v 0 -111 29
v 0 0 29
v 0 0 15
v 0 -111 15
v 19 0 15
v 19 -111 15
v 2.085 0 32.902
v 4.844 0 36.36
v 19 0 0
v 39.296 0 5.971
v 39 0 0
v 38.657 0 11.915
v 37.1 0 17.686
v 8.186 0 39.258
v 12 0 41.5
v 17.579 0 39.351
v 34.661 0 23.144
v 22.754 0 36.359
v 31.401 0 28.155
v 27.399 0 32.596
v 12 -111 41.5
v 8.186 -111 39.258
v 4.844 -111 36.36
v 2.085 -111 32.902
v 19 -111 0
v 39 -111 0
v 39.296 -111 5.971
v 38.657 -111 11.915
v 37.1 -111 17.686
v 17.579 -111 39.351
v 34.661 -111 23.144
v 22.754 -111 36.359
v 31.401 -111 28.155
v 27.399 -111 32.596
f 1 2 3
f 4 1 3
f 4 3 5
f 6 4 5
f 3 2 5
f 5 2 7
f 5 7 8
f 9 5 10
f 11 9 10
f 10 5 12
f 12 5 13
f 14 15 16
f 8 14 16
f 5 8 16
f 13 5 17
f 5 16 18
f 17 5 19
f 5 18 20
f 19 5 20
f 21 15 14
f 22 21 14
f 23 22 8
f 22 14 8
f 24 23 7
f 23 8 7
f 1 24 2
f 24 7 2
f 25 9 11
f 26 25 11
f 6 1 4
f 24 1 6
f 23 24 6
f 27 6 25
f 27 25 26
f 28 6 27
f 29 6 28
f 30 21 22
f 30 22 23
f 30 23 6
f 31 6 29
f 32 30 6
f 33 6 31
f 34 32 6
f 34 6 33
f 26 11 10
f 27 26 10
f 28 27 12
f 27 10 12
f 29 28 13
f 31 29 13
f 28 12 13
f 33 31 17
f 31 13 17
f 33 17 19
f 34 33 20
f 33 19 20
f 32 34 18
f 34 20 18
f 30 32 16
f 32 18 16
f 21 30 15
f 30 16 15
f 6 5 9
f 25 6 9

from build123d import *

# Parameters (mm, degrees)
F1_DEPTH = 111


with BuildPart() as f1:
    # F0 (on Front) → F1 (new body)
    with BuildSketch(Plane.XZ):
        with BuildLine():
            Line((0, 29), (0, 15))
            Line((0, 15), (19, 15))
            Line((19, 15), (19, 0))
            Line((19, 0), (39, 0))
            ThreePointArc((39, 0), (33.128812, 25.713323), (12, 41.5))
            ThreePointArc((12, 41.5), (4.844107, 36.359658), (0, 29))
        make_face()
    extrude(amount=F1_DEPTH)


solid = f1.part
